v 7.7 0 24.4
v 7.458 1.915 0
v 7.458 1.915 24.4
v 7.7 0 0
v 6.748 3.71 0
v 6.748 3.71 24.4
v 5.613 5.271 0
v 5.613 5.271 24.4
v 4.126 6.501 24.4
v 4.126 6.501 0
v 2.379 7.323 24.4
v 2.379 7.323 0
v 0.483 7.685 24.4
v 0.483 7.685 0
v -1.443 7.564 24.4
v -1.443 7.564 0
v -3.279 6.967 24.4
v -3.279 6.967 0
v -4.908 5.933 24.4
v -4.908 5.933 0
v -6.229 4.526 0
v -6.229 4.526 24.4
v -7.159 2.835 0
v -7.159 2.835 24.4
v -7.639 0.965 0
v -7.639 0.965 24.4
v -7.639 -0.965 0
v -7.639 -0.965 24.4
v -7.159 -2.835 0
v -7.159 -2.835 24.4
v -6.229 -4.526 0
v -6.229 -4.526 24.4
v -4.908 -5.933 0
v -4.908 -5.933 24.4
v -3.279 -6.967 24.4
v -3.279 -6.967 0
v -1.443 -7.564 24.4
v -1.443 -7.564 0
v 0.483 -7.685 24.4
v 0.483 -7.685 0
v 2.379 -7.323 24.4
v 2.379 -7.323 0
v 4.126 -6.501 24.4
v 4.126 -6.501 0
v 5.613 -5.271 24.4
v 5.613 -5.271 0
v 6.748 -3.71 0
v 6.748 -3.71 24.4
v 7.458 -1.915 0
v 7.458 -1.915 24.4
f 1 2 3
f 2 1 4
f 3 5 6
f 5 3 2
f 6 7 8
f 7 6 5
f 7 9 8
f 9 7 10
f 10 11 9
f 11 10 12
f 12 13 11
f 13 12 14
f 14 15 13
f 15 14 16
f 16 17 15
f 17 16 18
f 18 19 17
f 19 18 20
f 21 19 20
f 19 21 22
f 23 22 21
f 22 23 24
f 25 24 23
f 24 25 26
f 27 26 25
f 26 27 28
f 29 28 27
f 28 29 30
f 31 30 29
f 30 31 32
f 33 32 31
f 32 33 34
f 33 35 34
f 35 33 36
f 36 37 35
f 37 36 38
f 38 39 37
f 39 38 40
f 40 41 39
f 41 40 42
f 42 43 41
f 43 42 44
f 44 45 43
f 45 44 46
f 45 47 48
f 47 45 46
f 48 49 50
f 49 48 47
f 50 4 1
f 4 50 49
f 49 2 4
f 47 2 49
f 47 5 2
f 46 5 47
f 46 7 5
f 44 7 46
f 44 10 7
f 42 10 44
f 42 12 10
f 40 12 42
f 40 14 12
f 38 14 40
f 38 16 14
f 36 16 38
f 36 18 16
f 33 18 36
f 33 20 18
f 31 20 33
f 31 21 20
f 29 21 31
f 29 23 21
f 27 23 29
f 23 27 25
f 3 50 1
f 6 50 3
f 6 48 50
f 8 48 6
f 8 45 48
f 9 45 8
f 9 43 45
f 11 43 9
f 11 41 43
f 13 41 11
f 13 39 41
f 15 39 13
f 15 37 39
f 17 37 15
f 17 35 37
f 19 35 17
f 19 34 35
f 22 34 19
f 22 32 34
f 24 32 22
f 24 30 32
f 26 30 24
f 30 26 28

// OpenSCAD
// file: Zrod.scad
use <../Parameters.scad>

function ZrodLength()=1000;
function ZrodDiameter()=8 + 3dPrinterTolerance()*3;  //base case: 8
function ZrodRadius()=ZrodDiameter()/2;

module Zrod()
{
color("Silver")
cylinder(ZrodLength(), ZrodRadius(), ZrodRadius());
}

Zrod();
// file: ../Parameters.scad
use<Vitamins/Zrod.scad>
//use<Vitamins/LinearBearing.scad>

//tolerances
function LaserCutTolerance() = .02;
function 3dPrinterTolerance() = .4;


function LinearBearingDiam() = 15 + 3dPrinterTolerance();
function mm(i) = i*25.4; 

//Build dimensions (x,y,z)-- x, y and z of printable area, NOT of overall device

//z-rod length, diameter-- dependent on which rods you buy
//(bearing diameter is dependent on rod diameter)


function ZBearingSpacing()= 105;
function ZrodSpacing()=ZBearingSpacing()-LinearBearingDiam()*2-PlasticWidth()*4;
echo(ZrodSpacing());

//parametric of which hotend is being used (printerbot or bucha nozzle)

//stepper vs servo

//3 parameters (1 for each link) horizontal vs vertical

//paper is a parametric vitamin

//distance between link arms will be calculable based on radius of toolplate








//the equation used for plastic width, it can of course be changed
function PlasticWidth()= (ZrodDiameter()/2);
function SideWidth() = (ZrodDiameter()+PlasticWidth());
// main file
use <../Parameters.scad>

function LinearBearingDiam() = 15 + 3dPrinterTolerance();
function LinearBearingInnerDiam() = 8.3 + 3dPrinterTolerance();
function LinearBearingHeight() = 24 + 3dPrinterTolerance();

module LinearBearing()
{
cylinder(LinearBearingHeight(), LinearBearingDiam()/2, LinearBearingDiam()/2, 0);
}


LinearBearing();
